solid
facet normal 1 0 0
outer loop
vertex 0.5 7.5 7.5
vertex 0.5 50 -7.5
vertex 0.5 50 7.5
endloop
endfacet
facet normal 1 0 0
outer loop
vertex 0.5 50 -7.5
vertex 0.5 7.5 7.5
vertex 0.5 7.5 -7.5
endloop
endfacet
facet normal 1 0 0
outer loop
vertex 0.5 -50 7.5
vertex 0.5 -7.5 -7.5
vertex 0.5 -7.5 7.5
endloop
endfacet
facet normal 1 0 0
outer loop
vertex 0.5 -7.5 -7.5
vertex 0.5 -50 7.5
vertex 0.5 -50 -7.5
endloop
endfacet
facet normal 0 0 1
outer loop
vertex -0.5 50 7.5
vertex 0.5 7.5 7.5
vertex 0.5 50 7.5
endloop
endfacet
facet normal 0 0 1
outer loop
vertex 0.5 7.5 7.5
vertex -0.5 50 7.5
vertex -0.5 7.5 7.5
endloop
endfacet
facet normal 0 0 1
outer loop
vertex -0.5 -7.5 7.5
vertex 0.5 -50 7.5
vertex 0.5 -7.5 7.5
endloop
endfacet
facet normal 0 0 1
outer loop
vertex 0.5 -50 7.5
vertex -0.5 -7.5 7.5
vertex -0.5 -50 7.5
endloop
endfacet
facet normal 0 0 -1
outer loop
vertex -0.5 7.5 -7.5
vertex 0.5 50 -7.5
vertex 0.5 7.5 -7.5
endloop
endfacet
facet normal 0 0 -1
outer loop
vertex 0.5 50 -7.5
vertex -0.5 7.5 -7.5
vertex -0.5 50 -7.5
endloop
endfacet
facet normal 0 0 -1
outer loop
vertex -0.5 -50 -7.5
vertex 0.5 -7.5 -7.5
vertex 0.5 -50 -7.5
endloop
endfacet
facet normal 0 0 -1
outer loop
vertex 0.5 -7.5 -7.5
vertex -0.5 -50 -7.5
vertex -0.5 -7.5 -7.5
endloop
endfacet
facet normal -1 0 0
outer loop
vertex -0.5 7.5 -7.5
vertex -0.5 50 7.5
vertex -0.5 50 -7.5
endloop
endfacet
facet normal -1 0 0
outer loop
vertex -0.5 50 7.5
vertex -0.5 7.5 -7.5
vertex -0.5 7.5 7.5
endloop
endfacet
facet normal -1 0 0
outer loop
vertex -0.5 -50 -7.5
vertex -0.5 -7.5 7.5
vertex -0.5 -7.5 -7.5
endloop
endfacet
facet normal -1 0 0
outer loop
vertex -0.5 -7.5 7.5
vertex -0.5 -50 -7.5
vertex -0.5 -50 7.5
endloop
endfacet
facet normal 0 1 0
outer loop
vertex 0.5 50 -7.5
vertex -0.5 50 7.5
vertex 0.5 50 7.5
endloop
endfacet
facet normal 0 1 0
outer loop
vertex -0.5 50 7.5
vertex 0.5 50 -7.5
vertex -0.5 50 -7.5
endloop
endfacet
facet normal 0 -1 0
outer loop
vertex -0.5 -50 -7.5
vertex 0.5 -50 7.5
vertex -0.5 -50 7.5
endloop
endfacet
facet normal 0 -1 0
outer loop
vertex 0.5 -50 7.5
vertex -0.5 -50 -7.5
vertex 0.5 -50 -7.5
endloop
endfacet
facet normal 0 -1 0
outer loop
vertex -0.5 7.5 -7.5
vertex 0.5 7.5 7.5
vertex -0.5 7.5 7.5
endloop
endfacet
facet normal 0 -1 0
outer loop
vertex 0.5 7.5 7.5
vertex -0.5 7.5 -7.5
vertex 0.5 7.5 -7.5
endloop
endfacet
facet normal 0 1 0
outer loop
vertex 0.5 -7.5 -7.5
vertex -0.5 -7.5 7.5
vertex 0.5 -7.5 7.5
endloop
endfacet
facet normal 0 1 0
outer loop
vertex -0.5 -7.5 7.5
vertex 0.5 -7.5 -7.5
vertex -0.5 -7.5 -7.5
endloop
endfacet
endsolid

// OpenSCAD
difference (){



translate([0,0,0]) rotate ([0,0,0]) cube(size = [1,100,15], center = true);
translate([0,0,0]) rotate ([0,0,0]) cube(size = [18,15,15], center = true);

}
